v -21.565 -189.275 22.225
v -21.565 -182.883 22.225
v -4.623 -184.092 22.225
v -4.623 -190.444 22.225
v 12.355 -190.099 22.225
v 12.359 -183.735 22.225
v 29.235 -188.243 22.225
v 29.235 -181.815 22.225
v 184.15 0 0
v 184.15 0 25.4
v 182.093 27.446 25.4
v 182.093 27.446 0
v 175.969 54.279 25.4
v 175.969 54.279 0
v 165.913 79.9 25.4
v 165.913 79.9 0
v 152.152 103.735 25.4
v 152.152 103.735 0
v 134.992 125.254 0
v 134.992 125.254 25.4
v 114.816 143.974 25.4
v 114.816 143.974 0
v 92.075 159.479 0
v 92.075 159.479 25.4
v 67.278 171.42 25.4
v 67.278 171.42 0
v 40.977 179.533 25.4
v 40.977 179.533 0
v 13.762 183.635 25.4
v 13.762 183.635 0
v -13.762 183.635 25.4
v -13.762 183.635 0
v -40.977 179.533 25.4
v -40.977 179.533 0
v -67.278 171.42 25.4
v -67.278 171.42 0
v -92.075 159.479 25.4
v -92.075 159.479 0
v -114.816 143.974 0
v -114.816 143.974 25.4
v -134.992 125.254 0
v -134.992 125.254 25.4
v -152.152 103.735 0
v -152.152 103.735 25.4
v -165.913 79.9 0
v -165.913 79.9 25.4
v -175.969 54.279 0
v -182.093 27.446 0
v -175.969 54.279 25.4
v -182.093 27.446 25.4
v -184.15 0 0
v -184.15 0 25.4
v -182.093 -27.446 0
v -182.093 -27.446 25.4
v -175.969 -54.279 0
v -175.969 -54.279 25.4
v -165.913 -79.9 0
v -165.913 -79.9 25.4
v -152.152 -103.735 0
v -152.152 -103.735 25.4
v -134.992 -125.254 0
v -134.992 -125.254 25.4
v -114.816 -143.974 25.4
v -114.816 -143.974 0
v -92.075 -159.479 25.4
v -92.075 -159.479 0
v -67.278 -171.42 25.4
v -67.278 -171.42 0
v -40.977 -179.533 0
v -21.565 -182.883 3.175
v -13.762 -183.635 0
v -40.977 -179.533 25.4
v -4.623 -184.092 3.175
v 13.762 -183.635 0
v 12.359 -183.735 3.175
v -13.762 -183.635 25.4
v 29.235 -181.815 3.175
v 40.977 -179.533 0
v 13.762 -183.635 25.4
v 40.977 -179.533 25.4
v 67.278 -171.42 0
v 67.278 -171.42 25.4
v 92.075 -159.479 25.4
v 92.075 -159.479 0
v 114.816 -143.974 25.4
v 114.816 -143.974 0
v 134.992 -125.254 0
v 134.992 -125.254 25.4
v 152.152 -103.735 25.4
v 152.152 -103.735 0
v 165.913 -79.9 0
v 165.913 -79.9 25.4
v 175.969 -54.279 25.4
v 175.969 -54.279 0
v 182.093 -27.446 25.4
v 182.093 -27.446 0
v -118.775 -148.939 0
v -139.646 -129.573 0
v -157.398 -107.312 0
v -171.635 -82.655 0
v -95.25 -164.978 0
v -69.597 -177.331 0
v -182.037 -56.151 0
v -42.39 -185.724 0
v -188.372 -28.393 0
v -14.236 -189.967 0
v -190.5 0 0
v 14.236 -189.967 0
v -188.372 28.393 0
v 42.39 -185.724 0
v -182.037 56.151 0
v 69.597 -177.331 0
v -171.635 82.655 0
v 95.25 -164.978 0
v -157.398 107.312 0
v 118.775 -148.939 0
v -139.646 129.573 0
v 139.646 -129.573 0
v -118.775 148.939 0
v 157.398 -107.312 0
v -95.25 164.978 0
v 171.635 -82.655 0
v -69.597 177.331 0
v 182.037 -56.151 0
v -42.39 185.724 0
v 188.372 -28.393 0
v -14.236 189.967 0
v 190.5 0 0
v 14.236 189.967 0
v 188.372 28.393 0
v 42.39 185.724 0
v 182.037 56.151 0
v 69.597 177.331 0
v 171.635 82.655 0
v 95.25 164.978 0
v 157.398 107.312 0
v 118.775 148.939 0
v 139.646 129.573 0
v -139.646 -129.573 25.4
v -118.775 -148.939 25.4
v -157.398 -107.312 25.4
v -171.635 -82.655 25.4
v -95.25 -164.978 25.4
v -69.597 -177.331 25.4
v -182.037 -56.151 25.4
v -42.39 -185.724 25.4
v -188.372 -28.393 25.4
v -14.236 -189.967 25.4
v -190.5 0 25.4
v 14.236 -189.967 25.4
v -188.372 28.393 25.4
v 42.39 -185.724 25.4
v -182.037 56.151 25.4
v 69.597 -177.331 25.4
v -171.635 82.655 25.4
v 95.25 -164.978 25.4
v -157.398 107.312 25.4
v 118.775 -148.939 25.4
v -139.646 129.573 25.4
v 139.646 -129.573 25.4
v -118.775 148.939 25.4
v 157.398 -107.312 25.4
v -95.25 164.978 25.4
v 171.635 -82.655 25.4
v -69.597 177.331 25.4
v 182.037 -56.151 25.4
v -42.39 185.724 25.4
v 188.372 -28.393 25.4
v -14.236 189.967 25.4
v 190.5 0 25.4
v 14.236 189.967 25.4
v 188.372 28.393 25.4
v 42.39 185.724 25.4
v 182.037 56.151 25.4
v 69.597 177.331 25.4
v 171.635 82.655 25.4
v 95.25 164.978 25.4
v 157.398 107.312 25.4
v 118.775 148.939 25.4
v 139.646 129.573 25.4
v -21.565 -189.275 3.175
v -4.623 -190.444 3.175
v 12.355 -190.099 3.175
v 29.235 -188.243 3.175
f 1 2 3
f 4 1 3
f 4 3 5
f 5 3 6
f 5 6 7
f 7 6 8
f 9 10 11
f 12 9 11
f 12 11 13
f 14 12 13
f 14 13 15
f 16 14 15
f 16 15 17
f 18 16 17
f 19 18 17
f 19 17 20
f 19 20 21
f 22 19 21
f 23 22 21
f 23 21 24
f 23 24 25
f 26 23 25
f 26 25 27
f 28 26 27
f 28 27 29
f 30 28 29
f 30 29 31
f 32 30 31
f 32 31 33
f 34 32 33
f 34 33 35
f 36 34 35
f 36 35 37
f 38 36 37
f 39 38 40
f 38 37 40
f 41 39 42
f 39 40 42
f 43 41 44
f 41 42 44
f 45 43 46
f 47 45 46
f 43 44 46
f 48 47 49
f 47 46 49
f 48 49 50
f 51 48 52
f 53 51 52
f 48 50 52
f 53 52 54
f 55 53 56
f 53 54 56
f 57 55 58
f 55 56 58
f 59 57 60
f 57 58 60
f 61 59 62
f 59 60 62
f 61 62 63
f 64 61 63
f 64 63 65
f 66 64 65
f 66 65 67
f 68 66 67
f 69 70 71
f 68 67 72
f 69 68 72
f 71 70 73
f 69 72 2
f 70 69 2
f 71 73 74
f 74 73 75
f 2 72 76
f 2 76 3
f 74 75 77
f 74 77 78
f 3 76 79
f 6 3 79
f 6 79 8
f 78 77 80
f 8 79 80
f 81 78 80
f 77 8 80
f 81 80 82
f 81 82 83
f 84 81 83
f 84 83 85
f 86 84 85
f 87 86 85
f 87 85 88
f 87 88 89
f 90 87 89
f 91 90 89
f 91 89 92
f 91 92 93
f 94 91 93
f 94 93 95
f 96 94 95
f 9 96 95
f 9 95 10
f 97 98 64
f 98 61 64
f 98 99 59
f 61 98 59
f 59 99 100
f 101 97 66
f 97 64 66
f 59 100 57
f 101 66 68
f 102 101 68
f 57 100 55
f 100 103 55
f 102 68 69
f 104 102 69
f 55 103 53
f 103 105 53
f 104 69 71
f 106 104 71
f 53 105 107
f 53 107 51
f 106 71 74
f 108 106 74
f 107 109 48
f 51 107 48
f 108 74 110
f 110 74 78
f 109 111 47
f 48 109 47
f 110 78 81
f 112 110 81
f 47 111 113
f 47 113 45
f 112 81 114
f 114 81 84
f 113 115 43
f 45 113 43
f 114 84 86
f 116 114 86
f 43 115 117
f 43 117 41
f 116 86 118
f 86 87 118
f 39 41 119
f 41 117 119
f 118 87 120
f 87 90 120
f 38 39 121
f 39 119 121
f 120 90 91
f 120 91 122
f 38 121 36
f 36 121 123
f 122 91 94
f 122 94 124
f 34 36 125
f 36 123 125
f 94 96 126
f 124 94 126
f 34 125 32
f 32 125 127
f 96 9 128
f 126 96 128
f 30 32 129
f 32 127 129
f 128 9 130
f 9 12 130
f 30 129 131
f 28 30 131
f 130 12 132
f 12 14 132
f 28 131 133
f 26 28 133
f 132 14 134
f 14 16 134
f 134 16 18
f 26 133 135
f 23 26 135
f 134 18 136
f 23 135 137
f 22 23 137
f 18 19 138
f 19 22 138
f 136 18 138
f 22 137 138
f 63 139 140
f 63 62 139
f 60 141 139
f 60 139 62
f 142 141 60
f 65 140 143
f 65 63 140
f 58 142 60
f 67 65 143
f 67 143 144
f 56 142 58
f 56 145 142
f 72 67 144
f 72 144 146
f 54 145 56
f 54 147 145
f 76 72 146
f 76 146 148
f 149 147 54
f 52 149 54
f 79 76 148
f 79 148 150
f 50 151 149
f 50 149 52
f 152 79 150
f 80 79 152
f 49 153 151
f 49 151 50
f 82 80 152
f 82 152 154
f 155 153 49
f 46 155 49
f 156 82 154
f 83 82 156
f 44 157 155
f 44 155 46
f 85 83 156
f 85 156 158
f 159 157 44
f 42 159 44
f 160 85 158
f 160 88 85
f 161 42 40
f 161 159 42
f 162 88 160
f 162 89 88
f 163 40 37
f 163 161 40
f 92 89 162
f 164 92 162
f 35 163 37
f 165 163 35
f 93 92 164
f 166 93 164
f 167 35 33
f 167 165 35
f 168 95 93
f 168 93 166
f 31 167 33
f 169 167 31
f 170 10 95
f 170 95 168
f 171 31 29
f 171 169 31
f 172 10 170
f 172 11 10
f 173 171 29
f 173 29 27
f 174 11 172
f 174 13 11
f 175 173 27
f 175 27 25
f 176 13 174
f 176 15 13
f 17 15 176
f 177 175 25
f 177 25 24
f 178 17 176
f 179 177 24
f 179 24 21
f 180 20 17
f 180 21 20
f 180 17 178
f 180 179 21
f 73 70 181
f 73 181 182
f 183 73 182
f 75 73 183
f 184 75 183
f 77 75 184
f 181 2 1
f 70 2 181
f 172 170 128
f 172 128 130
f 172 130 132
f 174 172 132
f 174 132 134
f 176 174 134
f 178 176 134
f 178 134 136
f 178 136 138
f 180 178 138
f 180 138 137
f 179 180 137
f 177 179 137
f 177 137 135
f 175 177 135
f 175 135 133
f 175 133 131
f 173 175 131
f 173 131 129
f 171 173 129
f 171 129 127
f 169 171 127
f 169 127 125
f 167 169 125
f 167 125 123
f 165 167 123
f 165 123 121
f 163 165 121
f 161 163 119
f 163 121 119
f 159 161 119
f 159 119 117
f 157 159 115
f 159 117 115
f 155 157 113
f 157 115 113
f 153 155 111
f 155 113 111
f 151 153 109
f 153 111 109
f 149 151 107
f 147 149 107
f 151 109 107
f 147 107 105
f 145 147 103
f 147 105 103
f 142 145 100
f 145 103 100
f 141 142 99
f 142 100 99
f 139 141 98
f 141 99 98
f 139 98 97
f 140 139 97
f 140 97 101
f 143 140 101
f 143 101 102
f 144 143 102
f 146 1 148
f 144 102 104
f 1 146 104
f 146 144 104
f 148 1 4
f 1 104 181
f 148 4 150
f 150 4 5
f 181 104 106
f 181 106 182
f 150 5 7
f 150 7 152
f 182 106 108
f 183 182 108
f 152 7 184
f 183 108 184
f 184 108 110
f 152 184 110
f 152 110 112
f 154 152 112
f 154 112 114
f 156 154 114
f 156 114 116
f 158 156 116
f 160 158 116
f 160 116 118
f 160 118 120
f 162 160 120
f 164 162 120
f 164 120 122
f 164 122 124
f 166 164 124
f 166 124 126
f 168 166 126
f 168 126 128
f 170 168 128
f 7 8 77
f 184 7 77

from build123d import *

# Parameters (mm, degrees)
SKETCH1_R               = 190.5
BOSS_EXTRUDE1_DEPTH     = 25.4
SKETCH2_R               = 184.15
CUT_EXTRUDE1_DEPTH      = 25.4
CUT_EXTRUDE2_REACH      = 272.602
CUT_EXTRUDE2_END_RADIUS = 190.5
SKETCH3_W               = 50.8
SKETCH3_H               = 19.05


with BuildPart() as part:
    # Sketch1 → Boss-Extrude1 (new body)
    with BuildSketch(Plane.XY):
        Circle(SKETCH1_R)
    extrude(amount=BOSS_EXTRUDE1_DEPTH)

    # Sketch2 → Cut-Extrude1 (cut)
    with BuildSketch(Plane.XY.offset(25.4)):
        Circle(SKETCH2_R)
    extrude(amount=-CUT_EXTRUDE1_DEPTH, mode=Mode.SUBTRACT)

    # Cut-Extrude2: up to this cylinder (the profile starts inside it)
    cut_extrude2_end = Plane(origin=(0, 0, 12.7), z_dir=(0, 0, -1)) * Cylinder(CUT_EXTRUDE2_END_RADIUS, 927.204, mode=Mode.PRIVATE)
    # Sketch3 → Cut-Extrude2 (cut, up to the surface)
    with BuildSketch(Plane(origin=(0, 0, 0), x_dir=(1, 0, 0), z_dir=(0, 1, 0)), mode=Mode.PRIVATE) as cut_extrude2_sk1:
        with Locations((3.83525529, -12.7)):
            Rectangle(SKETCH3_W, SKETCH3_H)
    cut_extrude2_tool1 = extrude(cut_extrude2_sk1.sketch, amount=-CUT_EXTRUDE2_REACH, mode=Mode.PRIVATE) & cut_extrude2_end
    add(cut_extrude2_tool1.solids().sort_by_distance((3.835255, 0, 12.7))[0], mode=Mode.SUBTRACT)


solid = part.part
